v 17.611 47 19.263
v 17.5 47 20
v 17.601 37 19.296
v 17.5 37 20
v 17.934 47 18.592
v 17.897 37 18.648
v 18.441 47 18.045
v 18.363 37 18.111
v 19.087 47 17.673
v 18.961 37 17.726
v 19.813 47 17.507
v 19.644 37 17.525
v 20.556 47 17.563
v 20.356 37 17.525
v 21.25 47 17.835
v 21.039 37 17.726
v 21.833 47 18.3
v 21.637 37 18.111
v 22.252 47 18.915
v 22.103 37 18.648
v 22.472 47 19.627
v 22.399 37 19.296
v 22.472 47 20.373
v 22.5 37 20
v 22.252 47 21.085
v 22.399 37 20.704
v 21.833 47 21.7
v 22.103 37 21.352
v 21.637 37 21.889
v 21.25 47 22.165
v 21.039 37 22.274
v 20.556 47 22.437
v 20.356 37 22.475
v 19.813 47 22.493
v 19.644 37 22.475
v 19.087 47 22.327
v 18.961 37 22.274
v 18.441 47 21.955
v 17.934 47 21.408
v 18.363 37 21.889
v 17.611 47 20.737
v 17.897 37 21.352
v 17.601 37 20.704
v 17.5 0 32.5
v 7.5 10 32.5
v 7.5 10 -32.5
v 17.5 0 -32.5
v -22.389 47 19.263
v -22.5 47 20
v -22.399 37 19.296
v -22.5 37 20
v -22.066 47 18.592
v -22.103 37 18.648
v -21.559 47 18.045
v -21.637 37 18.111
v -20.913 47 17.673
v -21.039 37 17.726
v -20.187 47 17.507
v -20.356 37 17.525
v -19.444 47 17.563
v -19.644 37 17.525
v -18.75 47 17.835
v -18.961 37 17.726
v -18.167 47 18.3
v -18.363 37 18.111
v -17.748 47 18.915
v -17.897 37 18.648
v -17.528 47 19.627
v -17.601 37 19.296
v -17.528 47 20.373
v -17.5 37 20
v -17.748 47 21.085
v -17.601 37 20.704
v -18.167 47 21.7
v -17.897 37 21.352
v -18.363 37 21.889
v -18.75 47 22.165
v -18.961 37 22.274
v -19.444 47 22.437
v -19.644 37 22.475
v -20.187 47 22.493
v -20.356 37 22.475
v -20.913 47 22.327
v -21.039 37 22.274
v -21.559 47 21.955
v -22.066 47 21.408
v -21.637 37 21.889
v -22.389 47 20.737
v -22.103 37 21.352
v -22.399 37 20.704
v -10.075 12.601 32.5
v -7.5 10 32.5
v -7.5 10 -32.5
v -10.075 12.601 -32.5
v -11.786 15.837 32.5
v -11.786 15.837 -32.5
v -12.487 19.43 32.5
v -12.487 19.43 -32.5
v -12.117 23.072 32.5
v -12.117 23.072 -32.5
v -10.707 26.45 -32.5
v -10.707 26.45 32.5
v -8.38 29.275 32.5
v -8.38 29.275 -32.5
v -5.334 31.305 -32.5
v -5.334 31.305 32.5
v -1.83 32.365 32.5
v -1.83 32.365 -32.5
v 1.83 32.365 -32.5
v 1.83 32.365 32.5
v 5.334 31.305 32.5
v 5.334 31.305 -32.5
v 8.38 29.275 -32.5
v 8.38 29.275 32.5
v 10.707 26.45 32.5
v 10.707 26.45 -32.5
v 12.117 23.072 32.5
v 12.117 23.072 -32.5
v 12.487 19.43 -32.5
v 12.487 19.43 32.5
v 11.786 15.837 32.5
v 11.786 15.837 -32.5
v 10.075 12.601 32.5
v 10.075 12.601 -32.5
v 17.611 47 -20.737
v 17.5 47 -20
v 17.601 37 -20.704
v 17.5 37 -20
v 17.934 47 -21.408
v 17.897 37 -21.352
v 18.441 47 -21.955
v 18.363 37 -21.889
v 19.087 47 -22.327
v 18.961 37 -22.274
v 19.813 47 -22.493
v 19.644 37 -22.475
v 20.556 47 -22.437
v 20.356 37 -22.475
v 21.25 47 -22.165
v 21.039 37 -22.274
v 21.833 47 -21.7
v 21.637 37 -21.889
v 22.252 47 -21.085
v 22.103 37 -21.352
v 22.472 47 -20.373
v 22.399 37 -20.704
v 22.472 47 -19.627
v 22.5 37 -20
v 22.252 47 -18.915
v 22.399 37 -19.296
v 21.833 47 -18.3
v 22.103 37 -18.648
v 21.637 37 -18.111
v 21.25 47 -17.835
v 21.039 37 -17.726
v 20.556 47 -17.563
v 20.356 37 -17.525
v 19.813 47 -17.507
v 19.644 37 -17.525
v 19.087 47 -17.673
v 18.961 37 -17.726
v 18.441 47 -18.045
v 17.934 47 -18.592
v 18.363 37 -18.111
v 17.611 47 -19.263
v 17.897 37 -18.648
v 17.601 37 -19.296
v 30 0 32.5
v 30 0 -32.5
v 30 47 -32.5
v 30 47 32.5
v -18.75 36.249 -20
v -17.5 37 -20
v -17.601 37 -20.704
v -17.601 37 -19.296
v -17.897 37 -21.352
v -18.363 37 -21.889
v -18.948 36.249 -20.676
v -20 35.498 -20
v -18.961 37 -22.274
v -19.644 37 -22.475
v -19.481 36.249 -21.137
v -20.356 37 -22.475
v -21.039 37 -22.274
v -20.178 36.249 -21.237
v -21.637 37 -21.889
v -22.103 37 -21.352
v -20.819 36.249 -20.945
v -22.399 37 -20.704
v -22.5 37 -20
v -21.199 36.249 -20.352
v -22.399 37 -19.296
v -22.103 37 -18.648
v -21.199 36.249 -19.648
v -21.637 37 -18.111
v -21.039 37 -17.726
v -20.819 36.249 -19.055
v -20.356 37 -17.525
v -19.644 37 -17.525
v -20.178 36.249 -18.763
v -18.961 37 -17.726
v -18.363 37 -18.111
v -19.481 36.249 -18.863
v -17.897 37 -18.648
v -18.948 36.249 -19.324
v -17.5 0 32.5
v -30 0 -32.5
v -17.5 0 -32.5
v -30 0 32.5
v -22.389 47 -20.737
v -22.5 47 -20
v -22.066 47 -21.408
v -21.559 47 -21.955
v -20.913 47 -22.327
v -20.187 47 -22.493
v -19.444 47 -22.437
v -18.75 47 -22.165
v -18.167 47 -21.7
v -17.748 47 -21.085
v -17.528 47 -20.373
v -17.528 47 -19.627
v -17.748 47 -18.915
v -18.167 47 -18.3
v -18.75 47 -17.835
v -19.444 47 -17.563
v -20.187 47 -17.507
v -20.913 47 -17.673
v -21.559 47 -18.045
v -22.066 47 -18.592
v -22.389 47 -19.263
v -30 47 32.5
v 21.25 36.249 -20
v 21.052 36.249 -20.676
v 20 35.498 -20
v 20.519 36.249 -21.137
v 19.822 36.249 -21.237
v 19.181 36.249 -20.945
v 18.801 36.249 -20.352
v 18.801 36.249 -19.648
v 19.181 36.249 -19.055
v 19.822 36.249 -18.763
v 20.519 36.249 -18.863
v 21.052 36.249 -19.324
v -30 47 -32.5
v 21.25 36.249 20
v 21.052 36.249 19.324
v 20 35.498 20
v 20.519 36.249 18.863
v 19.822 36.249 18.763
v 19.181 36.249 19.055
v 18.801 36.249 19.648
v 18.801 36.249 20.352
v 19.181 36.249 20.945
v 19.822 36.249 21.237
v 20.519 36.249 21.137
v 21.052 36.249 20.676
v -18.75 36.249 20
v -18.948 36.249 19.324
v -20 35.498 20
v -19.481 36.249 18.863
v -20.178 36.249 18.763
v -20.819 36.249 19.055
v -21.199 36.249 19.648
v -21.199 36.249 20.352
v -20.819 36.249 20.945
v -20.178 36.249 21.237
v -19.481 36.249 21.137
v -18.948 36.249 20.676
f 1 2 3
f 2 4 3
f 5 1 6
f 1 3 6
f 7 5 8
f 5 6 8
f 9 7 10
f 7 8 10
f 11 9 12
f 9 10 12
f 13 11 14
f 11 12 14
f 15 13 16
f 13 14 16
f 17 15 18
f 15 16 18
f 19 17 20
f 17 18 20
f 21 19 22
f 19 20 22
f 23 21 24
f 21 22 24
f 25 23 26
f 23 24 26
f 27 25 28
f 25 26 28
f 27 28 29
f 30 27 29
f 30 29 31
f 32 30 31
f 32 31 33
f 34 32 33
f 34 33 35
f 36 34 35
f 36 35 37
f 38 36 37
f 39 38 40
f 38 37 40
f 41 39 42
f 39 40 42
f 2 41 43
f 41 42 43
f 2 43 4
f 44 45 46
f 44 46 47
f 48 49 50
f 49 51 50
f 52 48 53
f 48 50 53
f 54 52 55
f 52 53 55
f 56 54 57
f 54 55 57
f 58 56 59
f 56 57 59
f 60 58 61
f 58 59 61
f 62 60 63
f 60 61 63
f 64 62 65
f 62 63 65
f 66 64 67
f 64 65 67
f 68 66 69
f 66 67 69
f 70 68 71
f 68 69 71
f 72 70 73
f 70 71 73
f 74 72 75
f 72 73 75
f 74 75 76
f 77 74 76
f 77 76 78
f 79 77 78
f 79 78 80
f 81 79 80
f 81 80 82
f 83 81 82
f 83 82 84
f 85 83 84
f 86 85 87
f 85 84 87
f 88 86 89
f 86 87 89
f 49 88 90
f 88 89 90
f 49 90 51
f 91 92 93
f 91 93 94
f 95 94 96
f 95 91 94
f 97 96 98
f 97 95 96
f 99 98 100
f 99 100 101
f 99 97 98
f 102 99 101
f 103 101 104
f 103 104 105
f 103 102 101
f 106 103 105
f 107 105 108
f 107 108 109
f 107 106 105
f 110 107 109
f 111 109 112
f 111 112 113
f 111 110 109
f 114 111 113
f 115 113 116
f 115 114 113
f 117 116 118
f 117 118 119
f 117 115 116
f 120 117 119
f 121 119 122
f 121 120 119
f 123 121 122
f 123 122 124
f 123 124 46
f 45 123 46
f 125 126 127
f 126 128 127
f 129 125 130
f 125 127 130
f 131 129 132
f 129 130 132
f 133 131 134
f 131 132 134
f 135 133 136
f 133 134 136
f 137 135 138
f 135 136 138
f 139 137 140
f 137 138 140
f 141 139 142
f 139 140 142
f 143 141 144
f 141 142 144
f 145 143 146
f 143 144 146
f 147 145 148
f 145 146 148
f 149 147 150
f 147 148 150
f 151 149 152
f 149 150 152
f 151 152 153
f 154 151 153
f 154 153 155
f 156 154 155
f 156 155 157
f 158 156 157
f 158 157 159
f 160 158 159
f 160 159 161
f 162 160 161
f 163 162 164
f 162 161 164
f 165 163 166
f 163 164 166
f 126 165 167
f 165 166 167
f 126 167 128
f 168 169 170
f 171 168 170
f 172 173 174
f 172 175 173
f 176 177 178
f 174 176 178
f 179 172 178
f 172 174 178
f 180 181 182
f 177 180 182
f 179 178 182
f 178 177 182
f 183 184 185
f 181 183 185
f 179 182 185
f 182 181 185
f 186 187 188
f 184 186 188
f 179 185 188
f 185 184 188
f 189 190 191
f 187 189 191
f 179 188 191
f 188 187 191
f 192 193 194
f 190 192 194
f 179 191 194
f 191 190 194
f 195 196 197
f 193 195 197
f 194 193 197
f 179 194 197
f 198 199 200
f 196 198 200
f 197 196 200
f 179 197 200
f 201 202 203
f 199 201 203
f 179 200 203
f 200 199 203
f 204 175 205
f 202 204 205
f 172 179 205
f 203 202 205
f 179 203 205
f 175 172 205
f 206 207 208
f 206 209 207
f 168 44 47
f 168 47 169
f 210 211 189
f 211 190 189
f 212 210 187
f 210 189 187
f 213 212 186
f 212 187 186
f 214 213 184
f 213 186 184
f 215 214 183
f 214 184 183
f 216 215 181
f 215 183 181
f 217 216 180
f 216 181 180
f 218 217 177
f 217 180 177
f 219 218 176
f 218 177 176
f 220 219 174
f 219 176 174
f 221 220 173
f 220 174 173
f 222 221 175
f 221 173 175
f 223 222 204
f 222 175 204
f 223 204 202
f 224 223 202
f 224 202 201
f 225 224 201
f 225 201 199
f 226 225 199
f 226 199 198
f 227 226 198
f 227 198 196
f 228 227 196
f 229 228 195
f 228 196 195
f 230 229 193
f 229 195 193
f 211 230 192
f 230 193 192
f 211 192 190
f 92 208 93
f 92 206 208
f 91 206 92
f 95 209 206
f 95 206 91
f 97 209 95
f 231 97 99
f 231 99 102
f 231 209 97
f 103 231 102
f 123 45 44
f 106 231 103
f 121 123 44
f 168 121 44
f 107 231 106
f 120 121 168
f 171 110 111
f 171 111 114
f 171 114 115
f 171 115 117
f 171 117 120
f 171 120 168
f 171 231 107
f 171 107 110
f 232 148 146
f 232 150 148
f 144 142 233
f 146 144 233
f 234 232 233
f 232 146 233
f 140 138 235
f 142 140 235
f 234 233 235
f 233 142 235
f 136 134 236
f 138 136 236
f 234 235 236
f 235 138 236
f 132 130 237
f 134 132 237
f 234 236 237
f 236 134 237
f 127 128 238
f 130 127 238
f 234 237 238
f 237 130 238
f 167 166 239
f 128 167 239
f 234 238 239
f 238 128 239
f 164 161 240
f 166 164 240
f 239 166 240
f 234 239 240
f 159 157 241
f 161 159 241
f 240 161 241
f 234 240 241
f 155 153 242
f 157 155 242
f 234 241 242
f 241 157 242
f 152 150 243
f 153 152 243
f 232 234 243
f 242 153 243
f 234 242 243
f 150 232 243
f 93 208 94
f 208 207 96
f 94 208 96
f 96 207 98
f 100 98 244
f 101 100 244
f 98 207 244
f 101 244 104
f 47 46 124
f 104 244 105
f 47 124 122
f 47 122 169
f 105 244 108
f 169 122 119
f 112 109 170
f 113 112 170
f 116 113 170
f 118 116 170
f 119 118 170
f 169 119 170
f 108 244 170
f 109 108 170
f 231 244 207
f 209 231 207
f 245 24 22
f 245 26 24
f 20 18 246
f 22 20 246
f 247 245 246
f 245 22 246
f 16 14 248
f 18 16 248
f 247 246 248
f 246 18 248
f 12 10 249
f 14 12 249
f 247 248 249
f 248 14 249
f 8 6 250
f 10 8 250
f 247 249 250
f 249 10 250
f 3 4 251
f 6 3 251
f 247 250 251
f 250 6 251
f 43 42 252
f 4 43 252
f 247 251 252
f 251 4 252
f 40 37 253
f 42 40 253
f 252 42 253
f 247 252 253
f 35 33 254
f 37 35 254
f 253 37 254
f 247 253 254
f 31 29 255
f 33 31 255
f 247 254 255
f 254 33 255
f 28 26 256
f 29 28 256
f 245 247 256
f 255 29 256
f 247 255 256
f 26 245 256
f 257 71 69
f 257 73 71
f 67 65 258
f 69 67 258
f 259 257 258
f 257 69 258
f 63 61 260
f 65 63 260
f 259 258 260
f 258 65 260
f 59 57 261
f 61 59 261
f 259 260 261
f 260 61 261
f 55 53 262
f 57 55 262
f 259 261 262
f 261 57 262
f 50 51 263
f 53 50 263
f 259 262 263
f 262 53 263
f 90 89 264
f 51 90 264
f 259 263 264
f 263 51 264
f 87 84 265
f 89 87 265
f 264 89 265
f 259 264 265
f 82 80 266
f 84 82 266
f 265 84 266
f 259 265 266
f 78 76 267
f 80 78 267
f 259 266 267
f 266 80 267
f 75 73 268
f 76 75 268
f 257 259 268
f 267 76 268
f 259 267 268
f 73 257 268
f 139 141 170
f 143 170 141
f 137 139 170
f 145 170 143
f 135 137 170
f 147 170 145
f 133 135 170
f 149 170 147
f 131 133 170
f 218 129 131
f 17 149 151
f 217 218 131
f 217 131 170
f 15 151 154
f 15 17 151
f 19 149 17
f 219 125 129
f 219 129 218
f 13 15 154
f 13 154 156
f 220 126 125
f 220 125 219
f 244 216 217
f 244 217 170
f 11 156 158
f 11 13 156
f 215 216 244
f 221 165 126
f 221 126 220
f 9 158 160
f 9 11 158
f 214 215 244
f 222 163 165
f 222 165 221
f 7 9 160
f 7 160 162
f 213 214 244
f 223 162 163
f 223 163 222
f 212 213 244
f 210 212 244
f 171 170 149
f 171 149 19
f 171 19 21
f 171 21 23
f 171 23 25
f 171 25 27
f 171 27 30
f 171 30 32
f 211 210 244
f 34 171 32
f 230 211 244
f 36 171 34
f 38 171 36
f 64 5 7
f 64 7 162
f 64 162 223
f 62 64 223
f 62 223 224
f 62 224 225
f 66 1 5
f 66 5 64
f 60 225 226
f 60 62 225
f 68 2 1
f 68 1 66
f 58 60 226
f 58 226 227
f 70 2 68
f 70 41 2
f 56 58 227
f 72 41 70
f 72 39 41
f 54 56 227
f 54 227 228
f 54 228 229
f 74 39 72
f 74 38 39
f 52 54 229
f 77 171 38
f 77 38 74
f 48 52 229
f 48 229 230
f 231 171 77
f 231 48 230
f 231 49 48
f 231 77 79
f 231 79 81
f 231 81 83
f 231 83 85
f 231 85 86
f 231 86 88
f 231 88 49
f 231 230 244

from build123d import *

# Parameters (mm, degrees)
EXTRUDE_1_DEPTH        = 32.5
HOLE_WIZARD_M6_1_D     = 5
HOLE_WIZARD_M6_1_DEPTH = 10
HOLE_WIZARD_M6_1_TIP   = 1.502151548


with BuildPart() as part:
    # 草图1 → 凸台-拉伸1 (new body, symmetric)
    with BuildSketch(Plane.XY):
        with BuildLine():
            Line((-17.5, 0), (-7.5, 10))
            ThreePointArc((-7.5, 10), (0, 32.5), (7.5, 10))
            Line((7.5, 10), (17.5, 0))
            Line((17.5, 0), (30, 0))
            Line((30, 0), (30, 47))
            Line((30, 47), (-30, 47))
            Line((-30, 47), (-30, 0))
            Line((-30, 0), (-17.5, 0))
        make_face()
    extrude(amount=EXTRUDE_1_DEPTH, both=True)

    # M6 螺纹孔1
    with Locations(Plane(origin=(-20, 47, -20), x_dir=(1, 0, 0), z_dir=(0, 1, 0))):
        with Locations((0, 0), (40, 0), (40, -40), (0, -40)):
            Hole(HOLE_WIZARD_M6_1_D / 2, depth=HOLE_WIZARD_M6_1_DEPTH)
            with Locations((0, 0, -(HOLE_WIZARD_M6_1_DEPTH + HOLE_WIZARD_M6_1_TIP / 2))):  # 118° drill point
                Cone(0, HOLE_WIZARD_M6_1_D / 2, HOLE_WIZARD_M6_1_TIP, mode=Mode.SUBTRACT)


solid = part.part
